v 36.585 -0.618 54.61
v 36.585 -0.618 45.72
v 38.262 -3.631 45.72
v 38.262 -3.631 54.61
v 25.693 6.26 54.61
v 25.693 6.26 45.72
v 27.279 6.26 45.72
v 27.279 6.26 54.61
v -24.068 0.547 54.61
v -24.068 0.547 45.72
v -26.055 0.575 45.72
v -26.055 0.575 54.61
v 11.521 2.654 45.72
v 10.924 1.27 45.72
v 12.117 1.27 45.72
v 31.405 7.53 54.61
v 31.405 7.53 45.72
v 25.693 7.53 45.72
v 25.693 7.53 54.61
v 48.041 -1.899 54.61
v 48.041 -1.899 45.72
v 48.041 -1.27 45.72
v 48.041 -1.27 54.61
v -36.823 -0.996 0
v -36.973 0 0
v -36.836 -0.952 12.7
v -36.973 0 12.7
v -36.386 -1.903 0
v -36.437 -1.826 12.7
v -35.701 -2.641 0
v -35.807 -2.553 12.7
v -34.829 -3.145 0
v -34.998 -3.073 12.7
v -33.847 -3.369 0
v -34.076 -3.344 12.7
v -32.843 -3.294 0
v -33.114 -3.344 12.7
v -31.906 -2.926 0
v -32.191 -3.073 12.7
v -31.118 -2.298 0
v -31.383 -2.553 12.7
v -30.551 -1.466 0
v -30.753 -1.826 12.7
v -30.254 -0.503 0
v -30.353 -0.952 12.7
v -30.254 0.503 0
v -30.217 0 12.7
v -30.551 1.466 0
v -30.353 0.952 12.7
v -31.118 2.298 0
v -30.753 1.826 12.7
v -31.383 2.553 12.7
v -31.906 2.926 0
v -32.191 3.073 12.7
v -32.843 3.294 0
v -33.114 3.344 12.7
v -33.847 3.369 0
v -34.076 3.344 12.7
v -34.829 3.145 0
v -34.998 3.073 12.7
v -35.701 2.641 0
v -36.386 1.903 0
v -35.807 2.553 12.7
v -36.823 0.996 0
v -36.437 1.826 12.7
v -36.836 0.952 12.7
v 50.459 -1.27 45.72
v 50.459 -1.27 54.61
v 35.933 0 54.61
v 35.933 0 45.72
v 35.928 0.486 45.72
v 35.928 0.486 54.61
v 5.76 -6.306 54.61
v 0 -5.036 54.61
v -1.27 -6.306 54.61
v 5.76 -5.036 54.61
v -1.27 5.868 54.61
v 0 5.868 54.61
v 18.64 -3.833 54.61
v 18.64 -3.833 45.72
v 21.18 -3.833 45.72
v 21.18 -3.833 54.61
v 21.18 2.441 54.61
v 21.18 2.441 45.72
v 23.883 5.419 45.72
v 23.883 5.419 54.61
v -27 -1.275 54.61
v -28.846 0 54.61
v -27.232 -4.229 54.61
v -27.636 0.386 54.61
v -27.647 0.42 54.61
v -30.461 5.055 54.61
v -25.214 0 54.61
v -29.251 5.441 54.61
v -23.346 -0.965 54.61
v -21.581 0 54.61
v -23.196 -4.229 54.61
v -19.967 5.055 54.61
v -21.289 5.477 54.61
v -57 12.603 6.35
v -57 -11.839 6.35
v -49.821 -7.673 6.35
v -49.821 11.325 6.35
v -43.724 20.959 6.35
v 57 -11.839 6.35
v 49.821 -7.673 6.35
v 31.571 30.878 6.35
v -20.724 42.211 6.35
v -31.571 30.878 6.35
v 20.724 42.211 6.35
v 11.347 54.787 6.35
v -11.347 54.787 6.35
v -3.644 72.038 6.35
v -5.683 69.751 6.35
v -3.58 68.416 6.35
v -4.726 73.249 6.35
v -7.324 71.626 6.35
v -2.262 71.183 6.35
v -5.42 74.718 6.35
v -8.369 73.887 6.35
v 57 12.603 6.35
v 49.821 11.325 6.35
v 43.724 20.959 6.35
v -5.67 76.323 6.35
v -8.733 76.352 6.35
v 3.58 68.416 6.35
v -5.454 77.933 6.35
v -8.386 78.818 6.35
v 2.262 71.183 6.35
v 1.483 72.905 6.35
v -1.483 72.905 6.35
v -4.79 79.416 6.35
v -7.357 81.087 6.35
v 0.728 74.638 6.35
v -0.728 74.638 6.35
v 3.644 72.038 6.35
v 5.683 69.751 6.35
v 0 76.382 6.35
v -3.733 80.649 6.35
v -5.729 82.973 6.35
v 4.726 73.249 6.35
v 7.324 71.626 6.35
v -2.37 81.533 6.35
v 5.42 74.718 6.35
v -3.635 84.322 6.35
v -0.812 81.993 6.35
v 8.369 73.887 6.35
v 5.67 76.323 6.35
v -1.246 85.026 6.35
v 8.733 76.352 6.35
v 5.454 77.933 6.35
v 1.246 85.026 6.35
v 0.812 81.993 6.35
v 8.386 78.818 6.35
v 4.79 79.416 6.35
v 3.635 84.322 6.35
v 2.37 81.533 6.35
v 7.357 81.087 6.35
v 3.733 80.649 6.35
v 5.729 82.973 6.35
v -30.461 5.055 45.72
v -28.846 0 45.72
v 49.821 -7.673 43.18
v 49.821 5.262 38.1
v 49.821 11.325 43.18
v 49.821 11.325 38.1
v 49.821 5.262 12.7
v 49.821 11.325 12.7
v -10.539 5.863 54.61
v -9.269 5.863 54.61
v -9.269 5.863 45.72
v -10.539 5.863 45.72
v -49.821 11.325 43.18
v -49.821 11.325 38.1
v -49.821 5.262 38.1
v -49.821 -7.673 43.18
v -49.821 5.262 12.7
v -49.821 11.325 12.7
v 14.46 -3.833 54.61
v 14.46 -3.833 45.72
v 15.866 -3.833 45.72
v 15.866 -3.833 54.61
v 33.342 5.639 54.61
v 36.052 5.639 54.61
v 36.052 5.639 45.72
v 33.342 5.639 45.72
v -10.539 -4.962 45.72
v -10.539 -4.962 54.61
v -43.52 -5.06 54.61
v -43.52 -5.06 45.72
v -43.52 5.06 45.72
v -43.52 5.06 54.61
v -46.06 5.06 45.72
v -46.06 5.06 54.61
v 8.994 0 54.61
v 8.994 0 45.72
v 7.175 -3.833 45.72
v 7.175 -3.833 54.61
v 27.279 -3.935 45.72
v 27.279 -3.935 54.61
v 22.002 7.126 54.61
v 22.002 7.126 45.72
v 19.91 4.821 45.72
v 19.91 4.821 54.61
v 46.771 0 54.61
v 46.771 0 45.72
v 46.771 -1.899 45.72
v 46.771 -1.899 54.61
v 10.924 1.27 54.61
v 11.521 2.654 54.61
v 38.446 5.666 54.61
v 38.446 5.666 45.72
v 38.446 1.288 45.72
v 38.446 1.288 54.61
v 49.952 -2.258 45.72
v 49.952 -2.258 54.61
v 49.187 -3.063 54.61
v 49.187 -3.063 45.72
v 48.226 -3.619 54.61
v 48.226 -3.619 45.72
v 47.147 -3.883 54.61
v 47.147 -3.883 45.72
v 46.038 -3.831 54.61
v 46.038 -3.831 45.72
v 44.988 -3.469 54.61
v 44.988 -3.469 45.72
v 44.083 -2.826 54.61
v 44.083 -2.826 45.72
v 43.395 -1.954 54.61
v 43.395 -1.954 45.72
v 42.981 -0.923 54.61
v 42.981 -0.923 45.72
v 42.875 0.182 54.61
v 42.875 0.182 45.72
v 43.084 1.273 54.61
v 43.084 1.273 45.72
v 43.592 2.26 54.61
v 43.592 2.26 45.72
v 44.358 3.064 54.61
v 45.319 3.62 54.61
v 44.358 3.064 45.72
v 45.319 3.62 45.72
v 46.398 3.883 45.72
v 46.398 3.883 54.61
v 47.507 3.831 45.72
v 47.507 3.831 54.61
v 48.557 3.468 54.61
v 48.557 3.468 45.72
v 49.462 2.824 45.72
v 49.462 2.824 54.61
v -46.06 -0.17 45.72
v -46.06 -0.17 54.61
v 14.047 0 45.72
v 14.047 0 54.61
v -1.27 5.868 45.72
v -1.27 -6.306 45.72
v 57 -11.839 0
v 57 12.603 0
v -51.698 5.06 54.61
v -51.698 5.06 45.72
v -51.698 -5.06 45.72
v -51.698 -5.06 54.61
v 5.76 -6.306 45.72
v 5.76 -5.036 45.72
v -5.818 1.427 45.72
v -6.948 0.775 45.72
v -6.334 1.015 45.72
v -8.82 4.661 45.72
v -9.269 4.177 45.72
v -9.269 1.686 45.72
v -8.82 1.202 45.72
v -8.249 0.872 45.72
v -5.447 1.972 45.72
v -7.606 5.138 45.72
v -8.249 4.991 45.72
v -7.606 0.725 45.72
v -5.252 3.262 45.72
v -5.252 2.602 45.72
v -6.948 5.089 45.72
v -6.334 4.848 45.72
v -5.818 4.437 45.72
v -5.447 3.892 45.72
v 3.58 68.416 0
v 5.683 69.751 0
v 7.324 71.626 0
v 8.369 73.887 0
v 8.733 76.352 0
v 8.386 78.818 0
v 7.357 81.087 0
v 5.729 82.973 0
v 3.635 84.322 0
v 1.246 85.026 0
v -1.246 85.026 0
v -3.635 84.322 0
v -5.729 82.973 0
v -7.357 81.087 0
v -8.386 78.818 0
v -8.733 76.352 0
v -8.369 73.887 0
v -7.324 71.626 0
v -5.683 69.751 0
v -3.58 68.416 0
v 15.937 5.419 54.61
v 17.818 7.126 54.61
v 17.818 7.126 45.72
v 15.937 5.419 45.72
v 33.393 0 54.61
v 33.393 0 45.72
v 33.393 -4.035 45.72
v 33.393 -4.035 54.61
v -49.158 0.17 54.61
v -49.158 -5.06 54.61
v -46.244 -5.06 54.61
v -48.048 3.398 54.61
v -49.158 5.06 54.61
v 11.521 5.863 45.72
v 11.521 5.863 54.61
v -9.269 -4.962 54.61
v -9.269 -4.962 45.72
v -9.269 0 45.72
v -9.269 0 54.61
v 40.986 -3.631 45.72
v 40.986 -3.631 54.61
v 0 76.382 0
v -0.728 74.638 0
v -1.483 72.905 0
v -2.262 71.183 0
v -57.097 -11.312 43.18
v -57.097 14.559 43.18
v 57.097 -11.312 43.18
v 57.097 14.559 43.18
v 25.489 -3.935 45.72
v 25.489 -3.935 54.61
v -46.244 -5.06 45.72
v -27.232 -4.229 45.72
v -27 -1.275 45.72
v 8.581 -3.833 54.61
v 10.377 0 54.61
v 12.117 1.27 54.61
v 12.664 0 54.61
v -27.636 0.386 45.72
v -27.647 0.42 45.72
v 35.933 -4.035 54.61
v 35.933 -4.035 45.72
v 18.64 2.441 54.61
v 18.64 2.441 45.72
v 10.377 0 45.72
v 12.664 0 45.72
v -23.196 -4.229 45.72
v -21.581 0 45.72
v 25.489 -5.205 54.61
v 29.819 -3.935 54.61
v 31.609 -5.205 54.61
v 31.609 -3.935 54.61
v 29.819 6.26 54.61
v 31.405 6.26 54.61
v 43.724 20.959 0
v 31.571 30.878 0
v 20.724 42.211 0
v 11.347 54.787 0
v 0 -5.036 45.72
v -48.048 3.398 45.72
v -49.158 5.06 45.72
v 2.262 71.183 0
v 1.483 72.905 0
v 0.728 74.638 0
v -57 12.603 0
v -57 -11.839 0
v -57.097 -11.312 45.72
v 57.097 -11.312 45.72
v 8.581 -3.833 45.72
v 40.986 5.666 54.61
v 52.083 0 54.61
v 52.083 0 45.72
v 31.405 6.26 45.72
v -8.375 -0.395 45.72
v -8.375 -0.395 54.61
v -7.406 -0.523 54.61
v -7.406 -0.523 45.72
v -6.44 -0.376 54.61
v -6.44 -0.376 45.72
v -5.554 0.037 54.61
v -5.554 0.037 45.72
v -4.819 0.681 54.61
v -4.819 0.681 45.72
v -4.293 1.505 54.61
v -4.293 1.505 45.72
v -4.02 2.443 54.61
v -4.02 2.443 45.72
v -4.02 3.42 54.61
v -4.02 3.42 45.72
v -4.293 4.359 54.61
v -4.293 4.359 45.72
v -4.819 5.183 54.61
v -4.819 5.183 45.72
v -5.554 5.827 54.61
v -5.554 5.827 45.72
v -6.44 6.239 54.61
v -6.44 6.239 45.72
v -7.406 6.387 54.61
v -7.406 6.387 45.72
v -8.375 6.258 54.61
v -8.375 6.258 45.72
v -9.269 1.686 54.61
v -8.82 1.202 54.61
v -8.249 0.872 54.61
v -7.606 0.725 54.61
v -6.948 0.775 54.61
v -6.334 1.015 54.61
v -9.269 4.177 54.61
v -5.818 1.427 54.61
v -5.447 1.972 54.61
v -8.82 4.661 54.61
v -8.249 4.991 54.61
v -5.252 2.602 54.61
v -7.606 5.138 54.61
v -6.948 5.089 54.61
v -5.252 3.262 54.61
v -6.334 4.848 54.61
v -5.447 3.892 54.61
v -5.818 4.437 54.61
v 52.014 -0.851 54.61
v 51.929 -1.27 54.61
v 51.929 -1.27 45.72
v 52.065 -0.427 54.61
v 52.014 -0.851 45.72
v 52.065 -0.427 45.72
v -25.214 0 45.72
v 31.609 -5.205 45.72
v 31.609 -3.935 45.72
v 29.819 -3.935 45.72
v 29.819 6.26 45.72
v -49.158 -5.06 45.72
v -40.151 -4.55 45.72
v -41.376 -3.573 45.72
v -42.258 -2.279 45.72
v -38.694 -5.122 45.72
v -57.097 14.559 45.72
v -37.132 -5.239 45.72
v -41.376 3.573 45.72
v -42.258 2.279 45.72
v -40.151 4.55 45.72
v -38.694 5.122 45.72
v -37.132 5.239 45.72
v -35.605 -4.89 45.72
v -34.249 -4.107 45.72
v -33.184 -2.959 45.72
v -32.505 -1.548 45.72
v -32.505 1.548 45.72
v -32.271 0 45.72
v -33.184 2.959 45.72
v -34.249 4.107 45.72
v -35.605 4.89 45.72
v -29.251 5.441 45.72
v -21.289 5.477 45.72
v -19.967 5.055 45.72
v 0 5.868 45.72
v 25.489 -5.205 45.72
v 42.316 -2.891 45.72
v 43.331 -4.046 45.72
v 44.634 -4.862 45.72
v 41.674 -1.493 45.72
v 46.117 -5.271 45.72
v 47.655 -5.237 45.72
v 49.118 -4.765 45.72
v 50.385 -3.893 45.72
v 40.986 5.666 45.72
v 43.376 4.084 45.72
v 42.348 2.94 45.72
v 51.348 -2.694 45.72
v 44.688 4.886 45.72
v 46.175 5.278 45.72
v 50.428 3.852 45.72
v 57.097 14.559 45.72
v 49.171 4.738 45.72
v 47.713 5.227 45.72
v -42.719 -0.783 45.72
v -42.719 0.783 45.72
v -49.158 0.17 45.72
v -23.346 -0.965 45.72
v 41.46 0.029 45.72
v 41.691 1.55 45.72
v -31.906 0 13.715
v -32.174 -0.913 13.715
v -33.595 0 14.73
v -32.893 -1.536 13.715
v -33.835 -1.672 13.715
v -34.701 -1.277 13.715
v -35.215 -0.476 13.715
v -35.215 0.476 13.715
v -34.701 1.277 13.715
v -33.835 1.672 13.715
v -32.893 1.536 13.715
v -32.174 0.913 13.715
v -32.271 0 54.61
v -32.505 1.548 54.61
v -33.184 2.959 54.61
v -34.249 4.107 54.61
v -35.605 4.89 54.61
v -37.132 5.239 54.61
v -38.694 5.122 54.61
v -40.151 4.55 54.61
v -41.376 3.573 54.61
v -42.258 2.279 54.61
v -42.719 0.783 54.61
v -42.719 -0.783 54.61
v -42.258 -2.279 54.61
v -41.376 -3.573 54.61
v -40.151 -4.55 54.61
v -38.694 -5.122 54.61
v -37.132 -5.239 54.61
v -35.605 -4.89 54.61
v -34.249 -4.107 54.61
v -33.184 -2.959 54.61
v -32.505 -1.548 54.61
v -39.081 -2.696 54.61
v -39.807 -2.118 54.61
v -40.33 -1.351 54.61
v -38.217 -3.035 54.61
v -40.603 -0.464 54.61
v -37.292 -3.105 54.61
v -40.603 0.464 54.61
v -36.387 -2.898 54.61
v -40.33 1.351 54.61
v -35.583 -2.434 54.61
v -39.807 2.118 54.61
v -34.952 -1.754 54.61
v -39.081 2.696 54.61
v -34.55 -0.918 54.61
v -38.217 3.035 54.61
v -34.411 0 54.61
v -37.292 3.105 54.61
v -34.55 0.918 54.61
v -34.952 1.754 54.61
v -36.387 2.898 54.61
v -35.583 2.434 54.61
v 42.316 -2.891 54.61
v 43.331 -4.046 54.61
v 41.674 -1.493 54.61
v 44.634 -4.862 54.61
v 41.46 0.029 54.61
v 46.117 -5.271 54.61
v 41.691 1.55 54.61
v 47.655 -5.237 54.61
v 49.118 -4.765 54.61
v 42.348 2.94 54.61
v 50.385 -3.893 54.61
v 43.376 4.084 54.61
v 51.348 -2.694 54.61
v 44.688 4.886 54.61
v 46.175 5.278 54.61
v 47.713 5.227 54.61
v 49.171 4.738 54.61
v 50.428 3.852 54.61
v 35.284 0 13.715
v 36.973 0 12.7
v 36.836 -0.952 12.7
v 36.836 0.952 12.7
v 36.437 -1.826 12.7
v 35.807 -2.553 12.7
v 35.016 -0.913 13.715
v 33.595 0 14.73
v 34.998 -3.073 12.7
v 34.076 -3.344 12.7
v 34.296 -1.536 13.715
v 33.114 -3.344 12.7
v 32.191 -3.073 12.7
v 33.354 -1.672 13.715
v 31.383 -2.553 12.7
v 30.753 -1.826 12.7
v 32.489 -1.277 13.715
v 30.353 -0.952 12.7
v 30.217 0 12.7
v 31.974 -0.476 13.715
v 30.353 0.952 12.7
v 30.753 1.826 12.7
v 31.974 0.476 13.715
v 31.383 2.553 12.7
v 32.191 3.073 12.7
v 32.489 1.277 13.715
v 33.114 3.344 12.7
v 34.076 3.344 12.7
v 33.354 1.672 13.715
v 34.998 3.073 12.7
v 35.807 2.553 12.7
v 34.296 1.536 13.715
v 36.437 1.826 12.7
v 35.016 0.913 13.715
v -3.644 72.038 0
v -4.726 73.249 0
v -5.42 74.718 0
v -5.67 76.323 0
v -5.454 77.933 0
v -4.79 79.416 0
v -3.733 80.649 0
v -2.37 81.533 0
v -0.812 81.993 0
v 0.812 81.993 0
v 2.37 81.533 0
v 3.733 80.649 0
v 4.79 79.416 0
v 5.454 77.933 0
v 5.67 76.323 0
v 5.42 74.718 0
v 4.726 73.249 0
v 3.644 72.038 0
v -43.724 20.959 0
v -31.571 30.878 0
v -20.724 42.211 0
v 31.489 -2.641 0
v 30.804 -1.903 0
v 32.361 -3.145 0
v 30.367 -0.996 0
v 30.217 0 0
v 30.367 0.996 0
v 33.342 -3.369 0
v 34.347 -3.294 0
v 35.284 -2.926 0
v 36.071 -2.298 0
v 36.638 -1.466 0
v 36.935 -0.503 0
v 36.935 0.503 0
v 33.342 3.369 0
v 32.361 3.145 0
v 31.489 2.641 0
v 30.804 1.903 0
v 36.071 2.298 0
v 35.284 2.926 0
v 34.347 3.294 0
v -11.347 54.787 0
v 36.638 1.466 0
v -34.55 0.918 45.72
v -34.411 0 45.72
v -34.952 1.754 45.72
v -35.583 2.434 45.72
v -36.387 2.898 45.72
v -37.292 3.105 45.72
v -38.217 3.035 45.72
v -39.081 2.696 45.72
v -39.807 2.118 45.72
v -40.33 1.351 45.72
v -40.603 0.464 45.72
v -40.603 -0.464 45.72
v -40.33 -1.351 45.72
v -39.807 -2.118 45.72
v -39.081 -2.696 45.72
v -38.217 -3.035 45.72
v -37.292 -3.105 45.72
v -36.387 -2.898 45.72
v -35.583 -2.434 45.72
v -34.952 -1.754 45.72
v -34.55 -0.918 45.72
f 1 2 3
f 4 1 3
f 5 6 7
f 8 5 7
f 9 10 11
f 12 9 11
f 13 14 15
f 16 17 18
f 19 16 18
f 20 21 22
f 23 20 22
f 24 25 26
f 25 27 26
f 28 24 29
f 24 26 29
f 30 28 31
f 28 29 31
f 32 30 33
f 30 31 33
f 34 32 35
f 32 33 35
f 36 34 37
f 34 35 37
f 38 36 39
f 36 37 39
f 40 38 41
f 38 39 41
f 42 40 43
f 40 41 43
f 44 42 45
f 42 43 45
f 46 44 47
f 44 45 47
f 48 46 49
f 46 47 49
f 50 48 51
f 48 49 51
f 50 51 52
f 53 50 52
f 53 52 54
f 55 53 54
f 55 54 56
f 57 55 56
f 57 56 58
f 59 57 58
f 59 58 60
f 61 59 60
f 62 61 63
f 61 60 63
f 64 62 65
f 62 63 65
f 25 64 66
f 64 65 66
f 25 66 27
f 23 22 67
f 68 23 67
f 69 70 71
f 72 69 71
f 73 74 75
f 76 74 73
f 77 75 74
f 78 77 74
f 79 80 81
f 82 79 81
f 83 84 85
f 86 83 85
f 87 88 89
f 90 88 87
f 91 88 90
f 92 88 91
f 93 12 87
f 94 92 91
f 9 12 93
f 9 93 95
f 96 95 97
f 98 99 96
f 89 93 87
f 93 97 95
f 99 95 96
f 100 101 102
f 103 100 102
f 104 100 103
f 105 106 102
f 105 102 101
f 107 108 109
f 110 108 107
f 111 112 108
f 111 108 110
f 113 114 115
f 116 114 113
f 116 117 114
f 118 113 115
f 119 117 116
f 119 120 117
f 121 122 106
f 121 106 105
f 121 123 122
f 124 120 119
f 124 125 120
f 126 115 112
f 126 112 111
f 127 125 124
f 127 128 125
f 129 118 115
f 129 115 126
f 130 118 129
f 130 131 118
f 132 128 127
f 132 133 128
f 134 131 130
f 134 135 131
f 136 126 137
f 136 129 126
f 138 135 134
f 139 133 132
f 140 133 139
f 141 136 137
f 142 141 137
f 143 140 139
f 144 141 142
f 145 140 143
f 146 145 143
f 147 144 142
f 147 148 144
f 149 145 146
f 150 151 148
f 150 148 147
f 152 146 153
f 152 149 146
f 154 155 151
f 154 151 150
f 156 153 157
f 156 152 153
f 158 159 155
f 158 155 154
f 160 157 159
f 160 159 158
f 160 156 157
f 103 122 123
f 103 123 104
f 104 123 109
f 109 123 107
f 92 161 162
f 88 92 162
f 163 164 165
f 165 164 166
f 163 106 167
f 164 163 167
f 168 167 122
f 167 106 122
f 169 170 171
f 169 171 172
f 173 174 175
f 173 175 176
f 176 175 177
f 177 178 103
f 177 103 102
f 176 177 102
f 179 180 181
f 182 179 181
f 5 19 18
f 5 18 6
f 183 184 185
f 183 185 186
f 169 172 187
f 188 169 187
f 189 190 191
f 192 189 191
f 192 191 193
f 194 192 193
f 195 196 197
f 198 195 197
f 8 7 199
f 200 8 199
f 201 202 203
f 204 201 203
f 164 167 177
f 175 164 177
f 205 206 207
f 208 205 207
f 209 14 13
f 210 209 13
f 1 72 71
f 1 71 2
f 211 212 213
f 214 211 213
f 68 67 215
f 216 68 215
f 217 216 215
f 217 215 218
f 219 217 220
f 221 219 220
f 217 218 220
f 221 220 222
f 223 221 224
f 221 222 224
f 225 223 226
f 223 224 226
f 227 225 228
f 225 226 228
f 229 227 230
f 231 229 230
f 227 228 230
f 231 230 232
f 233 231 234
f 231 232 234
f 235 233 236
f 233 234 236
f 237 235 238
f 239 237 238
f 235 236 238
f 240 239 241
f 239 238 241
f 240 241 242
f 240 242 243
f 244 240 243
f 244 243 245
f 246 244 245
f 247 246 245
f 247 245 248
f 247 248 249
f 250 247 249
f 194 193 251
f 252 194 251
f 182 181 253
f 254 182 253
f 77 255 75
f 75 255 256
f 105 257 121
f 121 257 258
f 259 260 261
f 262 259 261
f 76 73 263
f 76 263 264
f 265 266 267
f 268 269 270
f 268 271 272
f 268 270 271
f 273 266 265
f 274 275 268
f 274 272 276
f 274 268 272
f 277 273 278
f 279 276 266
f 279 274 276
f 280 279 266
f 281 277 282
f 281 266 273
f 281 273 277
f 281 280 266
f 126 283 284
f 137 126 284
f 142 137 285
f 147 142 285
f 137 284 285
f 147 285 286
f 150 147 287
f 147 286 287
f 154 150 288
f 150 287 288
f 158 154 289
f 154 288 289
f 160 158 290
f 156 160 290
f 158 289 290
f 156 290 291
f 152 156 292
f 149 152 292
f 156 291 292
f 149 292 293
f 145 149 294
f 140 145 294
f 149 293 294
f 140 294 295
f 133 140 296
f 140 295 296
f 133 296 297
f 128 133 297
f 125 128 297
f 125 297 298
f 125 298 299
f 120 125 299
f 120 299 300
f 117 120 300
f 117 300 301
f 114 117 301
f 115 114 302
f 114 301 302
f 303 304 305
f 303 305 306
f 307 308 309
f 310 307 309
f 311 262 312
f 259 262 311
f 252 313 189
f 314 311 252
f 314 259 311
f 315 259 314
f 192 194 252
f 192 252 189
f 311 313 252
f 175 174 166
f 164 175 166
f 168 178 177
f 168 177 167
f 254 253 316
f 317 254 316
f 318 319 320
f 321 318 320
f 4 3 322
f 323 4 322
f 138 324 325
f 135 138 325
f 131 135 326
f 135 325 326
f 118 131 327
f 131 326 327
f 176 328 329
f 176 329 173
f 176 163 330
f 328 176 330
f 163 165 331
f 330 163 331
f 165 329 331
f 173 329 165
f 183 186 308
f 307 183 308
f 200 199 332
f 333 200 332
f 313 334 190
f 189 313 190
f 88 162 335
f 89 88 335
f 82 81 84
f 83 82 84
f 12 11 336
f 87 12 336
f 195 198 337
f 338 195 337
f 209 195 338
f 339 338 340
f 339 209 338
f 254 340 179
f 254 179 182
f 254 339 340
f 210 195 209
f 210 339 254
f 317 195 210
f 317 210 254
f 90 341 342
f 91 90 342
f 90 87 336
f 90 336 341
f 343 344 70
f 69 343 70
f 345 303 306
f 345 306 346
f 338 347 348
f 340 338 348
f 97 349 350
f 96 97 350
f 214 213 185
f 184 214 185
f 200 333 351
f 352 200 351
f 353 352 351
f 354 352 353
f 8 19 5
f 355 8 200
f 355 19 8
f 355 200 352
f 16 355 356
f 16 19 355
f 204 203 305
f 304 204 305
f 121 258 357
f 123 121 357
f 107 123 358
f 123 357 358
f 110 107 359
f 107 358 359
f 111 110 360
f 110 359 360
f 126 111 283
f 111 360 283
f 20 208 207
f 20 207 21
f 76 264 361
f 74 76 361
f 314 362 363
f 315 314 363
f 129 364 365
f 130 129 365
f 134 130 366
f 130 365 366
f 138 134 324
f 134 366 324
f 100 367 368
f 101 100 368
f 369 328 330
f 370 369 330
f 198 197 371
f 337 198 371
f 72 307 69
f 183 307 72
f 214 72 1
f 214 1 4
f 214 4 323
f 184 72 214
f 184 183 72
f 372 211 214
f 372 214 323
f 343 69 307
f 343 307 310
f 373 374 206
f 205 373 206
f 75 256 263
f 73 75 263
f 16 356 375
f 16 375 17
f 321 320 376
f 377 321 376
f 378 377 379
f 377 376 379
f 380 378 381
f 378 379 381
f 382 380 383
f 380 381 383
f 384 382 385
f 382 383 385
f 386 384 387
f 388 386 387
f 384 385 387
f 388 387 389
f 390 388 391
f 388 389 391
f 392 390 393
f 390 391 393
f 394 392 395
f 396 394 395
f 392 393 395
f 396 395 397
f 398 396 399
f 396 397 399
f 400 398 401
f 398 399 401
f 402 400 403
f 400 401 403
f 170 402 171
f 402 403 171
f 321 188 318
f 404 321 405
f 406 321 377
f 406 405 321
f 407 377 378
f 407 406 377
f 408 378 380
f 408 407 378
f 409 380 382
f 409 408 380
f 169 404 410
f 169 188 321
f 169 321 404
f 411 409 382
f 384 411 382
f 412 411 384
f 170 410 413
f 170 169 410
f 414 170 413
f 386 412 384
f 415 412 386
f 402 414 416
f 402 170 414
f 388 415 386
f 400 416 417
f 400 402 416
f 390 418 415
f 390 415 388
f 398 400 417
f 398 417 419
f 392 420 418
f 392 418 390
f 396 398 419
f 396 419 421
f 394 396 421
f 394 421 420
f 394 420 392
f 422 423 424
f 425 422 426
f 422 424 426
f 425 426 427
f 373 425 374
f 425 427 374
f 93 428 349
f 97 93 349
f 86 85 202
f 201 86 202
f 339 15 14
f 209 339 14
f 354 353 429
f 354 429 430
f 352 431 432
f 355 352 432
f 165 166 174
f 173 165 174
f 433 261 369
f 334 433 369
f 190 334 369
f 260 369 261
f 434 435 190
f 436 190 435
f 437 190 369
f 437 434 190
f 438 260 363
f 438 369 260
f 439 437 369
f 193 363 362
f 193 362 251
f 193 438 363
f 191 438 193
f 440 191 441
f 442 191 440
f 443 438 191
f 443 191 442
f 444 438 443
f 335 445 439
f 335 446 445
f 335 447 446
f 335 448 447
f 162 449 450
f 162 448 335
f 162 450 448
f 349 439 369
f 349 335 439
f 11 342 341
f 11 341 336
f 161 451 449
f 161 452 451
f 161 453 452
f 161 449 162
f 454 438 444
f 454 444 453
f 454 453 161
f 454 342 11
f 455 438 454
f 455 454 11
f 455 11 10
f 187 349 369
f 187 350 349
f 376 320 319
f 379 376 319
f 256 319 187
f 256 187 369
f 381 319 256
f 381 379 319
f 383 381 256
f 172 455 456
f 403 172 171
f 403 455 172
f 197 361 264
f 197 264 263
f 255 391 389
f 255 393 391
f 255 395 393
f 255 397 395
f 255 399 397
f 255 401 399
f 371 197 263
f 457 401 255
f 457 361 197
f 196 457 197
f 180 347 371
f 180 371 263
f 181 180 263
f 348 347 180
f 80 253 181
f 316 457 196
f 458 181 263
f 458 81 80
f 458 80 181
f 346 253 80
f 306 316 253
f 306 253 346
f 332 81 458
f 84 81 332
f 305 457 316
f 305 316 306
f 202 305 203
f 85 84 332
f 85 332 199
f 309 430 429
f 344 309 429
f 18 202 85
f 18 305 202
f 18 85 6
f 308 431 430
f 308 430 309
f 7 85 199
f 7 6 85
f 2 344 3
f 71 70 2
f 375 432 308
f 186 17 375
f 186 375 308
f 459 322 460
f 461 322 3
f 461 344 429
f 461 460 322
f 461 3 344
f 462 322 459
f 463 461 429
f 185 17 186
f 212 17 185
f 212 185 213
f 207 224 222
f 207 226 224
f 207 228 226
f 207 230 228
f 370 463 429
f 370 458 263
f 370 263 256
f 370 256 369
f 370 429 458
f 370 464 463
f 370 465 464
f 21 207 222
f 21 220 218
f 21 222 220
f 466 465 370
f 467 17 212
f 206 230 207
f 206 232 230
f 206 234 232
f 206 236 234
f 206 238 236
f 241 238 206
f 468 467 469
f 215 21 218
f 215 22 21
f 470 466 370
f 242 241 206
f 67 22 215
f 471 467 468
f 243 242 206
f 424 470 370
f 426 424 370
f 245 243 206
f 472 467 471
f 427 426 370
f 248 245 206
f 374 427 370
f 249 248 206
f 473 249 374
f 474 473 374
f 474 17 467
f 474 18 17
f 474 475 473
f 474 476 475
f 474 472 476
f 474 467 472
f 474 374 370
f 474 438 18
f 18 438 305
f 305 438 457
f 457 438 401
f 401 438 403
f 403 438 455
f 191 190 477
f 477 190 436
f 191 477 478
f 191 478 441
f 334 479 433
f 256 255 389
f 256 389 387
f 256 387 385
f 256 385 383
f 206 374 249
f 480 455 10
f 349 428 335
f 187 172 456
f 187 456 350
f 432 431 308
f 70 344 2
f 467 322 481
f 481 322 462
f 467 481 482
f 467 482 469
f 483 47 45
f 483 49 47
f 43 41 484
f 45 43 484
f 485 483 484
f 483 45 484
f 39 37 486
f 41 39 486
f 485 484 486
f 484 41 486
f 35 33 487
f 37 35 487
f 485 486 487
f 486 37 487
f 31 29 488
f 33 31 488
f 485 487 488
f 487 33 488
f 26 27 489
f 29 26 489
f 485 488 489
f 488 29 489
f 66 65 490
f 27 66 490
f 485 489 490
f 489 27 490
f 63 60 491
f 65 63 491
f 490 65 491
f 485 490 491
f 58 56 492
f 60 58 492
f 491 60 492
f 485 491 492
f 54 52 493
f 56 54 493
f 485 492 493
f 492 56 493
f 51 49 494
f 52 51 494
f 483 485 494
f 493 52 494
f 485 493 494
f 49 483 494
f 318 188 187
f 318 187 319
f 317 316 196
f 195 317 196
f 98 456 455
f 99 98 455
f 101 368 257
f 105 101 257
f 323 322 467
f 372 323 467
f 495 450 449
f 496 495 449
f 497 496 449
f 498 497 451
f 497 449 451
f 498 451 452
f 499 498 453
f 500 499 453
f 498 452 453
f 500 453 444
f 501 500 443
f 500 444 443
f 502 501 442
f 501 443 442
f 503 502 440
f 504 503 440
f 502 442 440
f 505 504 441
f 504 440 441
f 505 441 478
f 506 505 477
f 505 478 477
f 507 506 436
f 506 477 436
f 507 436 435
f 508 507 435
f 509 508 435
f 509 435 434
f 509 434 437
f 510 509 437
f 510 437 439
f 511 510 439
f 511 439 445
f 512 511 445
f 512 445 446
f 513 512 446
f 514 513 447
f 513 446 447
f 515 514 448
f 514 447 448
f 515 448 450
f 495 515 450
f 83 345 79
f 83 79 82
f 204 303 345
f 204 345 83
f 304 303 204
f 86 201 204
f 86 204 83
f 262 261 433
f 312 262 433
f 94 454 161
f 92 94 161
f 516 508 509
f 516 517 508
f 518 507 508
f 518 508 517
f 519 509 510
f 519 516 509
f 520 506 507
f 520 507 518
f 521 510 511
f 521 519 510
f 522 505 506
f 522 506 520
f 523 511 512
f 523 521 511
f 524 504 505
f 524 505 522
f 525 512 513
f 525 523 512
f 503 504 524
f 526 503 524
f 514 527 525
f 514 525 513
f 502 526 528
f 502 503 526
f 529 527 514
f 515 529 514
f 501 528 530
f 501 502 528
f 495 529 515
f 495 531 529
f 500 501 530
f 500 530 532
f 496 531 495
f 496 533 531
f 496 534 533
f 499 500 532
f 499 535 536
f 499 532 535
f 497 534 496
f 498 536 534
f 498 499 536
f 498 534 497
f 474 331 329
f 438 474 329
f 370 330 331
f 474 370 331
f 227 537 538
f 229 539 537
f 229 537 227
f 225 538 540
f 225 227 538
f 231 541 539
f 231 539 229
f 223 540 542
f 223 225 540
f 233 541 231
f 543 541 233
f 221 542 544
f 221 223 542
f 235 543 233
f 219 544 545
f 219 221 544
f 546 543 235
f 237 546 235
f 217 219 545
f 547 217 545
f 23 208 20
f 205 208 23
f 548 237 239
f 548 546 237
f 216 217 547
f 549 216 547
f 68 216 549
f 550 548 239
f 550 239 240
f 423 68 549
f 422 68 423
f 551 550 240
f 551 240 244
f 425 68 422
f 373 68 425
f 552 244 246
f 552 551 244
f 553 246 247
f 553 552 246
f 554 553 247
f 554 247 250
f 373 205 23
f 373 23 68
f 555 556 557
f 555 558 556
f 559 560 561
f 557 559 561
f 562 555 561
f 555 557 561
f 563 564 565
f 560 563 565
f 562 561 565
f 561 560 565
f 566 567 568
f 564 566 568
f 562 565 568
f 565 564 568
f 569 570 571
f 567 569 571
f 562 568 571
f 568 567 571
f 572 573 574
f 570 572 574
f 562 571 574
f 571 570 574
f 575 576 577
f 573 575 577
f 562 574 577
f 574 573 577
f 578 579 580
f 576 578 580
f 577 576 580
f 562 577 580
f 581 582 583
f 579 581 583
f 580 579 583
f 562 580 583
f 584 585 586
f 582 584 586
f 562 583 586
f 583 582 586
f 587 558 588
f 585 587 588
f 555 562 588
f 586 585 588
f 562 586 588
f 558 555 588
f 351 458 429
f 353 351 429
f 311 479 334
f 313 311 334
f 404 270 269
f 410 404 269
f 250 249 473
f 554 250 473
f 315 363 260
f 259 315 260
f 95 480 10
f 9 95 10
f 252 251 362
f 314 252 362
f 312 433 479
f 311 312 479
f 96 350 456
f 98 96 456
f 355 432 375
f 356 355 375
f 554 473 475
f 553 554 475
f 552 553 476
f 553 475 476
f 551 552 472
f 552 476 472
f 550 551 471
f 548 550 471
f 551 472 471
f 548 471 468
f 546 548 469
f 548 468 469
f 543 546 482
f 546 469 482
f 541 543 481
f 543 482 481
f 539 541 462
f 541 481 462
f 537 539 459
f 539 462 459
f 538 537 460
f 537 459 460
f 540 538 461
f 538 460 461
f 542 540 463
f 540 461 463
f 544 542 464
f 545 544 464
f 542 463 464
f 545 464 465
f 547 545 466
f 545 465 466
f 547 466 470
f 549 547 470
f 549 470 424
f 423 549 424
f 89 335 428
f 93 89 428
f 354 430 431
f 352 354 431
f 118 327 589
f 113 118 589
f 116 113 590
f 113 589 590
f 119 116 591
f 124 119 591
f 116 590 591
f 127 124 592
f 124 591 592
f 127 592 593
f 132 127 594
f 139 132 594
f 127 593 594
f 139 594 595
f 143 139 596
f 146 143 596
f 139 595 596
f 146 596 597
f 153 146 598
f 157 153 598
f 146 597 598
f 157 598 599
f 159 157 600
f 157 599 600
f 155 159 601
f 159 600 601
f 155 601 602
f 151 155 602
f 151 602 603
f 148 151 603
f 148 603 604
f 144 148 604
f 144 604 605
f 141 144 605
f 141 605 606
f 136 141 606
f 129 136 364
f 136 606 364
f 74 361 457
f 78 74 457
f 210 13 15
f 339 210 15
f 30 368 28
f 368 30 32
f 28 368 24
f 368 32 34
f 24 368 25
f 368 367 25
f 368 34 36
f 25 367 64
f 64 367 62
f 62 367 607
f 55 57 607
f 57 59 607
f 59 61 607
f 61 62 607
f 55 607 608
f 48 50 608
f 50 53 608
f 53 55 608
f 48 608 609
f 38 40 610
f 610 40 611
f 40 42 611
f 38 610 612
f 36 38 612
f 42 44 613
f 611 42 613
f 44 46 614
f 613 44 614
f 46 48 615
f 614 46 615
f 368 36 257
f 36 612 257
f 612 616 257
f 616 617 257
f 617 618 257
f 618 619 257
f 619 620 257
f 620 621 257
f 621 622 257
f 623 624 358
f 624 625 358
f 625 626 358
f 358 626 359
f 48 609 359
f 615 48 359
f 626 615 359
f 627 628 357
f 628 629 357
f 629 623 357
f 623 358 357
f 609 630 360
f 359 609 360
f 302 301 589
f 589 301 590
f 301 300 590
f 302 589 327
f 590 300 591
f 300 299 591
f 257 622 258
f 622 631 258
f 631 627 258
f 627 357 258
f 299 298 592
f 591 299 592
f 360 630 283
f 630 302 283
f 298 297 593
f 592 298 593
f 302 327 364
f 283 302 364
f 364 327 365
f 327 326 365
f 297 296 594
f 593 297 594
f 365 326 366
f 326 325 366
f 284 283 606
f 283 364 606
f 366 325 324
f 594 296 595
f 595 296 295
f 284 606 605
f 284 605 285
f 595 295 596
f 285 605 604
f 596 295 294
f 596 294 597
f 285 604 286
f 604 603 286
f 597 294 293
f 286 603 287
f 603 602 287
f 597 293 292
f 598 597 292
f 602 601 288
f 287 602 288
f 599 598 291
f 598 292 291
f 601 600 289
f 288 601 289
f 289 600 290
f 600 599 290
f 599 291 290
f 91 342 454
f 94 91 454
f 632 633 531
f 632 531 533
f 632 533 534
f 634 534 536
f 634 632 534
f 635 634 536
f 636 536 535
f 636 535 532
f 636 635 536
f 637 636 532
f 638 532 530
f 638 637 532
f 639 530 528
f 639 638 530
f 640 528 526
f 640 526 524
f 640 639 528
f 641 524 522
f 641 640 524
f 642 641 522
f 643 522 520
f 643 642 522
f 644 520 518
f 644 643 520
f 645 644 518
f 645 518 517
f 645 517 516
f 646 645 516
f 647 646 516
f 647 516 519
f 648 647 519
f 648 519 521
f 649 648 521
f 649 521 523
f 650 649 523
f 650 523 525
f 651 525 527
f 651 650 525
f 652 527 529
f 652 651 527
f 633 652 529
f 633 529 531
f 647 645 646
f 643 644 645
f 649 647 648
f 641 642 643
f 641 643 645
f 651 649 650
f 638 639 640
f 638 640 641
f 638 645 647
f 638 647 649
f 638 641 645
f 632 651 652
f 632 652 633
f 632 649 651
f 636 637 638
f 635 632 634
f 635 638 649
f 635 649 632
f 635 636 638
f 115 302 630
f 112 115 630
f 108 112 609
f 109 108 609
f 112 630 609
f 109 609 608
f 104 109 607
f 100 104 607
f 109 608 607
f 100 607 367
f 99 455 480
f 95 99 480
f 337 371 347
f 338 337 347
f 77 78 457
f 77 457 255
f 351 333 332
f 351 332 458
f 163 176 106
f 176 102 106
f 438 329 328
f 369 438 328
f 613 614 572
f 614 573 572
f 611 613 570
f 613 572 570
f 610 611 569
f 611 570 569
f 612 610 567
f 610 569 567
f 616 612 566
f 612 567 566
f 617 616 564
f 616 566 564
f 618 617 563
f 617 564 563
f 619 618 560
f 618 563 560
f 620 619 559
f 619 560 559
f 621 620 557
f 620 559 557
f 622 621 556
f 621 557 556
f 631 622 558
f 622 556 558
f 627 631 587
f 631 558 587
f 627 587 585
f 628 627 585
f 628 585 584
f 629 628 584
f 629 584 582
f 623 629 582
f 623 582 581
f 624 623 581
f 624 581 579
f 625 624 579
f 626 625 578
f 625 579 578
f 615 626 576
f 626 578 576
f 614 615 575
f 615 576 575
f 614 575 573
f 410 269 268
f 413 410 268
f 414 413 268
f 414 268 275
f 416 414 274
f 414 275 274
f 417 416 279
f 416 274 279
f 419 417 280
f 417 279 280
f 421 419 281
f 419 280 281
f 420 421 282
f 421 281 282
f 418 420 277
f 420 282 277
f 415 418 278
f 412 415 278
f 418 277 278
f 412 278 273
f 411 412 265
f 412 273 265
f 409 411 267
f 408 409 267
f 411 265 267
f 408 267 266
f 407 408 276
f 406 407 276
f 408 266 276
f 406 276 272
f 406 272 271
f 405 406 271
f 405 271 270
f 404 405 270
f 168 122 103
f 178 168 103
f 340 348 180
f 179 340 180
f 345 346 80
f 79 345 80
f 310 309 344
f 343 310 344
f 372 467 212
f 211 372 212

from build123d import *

# Parameters (mm, degrees)
F1_DEPTH  = 6.35
F3_DEPTH  = 6.35
F5_DEPTH  = 25.4
F7_D      = 6.7564
F7_DEPTH  = 12.7
F7_TIP    = 2.0298273432
F9_DEPTH  = 5.08
F10_W     = 99.64261204
F10_H     = 18.998793792
F11_DEPTH = 2.54
F12_R     = 5.2534292615
F12_R_2   = 3.1134110093
F13_DEPTH = 8.89


with BuildPart() as f1:
    # F0 (on Top) → F1 (new body)
    with BuildSketch(Plane.XY):
        with BuildLine():
            Line((-56.9999665022, -11.8391886353), (0, -11.8391886353))
            Line((0, -11.8391886353), (56.9999665022, -11.8391886353))
            Line((56.9999665022, -11.8391886353), (56.9999665022, 12.603007257))
            ThreePointArc((56.9999665022, 12.603007257), (25.9733436303, 36.3780469183), (3.5801271207, 68.4162692798))
            ThreePointArc((3.5801271207, 68.4162692798), (0, 85.1150162439), (-3.5801271207, 68.4162692798))
            ThreePointArc((-3.5801271207, 68.4162692798), (-25.9733436303, 36.3780469183), (-56.9999665022, 12.603007257))
            Line((-56.9999665022, 12.603007257), (-56.9999665022, -11.8391886353))
        make_face()
        with BuildLine():
            ThreePointArc((2.2622125896, 71.1828075513), (1.1022822123, 73.769792923), (0, 76.3818621635))
            ThreePointArc((0, 76.3818621635), (-1.1022822123, 73.769792923), (-2.2622125896, 71.1828075513))
            ThreePointArc((-2.2622125896, 71.1828075513), (0, 82.0517629264), (2.2622125896, 71.1828075513))
        make_face(mode=Mode.SUBTRACT)
    extrude(amount=F1_DEPTH)

    # F2 (on face) → F3 (join)
    with BuildSketch(Plane.XY.offset(6.35)):
        Polygon((0, -7.67345028), (0, 0), (0, 11.325343512), (-49.82130602, 11.325343512), (-49.82130602, -7.67345028), align=None)
        Polygon((0, 11.325343512), (0, 0), (0, -7.67345028), (49.82130602, -7.67345028), (49.82130602, 11.325343512), align=None)
    extrude(amount=F3_DEPTH)

    # F4 (on face) → F5 (join)
    with BuildSketch(Plane.XY.offset(12.7)):
        Polygon((0, -7.67345028), (0, 0), (0, 5.2618985064), (-49.82130602, 5.2618985064), (-49.82130602, -7.67345028), align=None)
        Polygon((0, 5.2618985064), (0, 0), (0, -7.67345028), (49.82130602, -7.67345028), (49.82130602, 5.2618985064), align=None)
    extrude(amount=F5_DEPTH)

    # F7
    with Locations(Plane(origin=(0, 0, 0), x_dir=(1, 0, 0), z_dir=(0, 0, -1))):
        with Locations((33.5948169231, 0), (-33.5948169231, 0)):
            Hole(F7_D / 2, depth=F7_DEPTH)
            with Locations((0, 0, -(F7_DEPTH + F7_TIP / 2))):  # 118° drill point
                Cone(0, F7_D / 2, F7_TIP, mode=Mode.SUBTRACT)

    # F8 (on face) → F9 (join)
    with BuildSketch(Plane.XY.offset(38.1)):
        Polygon((49.82130602, 11.325343512), (0, 11.325343512), (-49.82130602, 11.325343512), (-49.82130602, 5.2618985064), (49.82130602, 5.2618985064), align=None)
        Polygon((49.82130602, 5.2618985064), (-49.82130602, 5.2618985064), (-49.82130602, -7.67345028), (0, -7.67345028), (49.82130602, -7.67345028), align=None)
    extrude(amount=F9_DEPTH)

    # F10 (on face) → F11 (join)
    with BuildSketch(Plane.XY.offset(43.18)):
        Polygon((57.0974387228, 14.5591804758), (0, 14.5591804758), (-57.0974387228, 14.5591804758), (-57.0974387228, -11.3115180284), (0, -11.3115180284), (57.0974387228, -11.3115180284), align=None)
        with Locations((0, 1.825946616)):
            Rectangle(F10_W, F10_H, mode=Mode.SUBTRACT)
        with Locations((0, 1.825946616)):
            Rectangle(F10_W, F10_H)
    extrude(amount=F11_DEPTH)

    # F12 (on face) → F13 (join)
    with BuildSketch(Plane.XY.offset(45.72)):
        Polygon((8.5808153566, -3.8332685363), (10.3769853802, 0), (11.520545464, 0), (12.6641055479, 0), (14.4602755714, -3.8332685363), (15.8660151064, -3.8332685363), (14.0469819307, 0), (11.520545464, 5.8634341694), (8.9941089973, 0), (7.1750758216, -3.8332685363), align=None)
        Polygon((12.1168879583, 1.27), (10.9242029697, 1.27), (11.520545464, 2.6540106426), align=None, mode=Mode.SUBTRACT)
        Polygon((15.9370799004, 5.4188976225), (18.6398400772, 2.4412850335), (18.6398400772, -3.8332685363), (21.1798400772, -3.8332685363), (21.1798400772, 2.4412850335), (23.8826002539, 5.4188976225), (22.0018450558, 7.1260472599), (19.9098400772, 4.821299538), (17.8178350986, 7.1260472599), align=None)
        with Locations((-37.5246331096, 0)):
            Circle(F12_R)
        with Locations((-37.5246331096, 0)):
            Circle(F12_R_2, mode=Mode.SUBTRACT)
        Polygon((-49.1576491702, -5.0597838126), (-49.1576491702, 0), (-49.1576491702, 0.1703951603), (-46.2440352845, -5.0597838126), (-46.0602679443, -5.0597838126), (-43.5202679443, -5.0597838126), (-43.5202679443, 0), (-43.5202679443, 5.0597838126), (-46.0602679443, 5.0597838126), (-46.0602679443, 0), (-46.0602679443, -0.1703951603), (-48.0481869093, 3.398084528), (-49.1576491702, 5.0597838126), (-51.6976491702, 5.0597838126), (-51.6976491702, 0), (-51.6976491702, -5.0597838126), align=None)
        Polygon((-30.4608233273, 5.0550824963), (-28.8462378085, 0), (-27.2316522896, -4.2287833057), (-25.2138245851, 0), (-23.1959968805, -4.2287833057), (-21.5814113617, 0), (-19.9668258429, 5.0550824963), (-21.2886028552, 5.4772560265), (-23.3462245652, -0.964922086), (-24.0676257065, 0.5469260742), (-26.0552410036, 0.5746004754), (-26.9999829904, -1.2750737017), (-27.6364480741, 0.3864049672), (-27.6471869469, 0.4200271491), (-29.2510335929, 5.4414874634), align=None)
        with BuildLine():
            Line((-9.2688109726, -4.9615180284), (-9.2688109726, 0))
            ThreePointArc((-9.2688109726, 0), (-3.9849187402, 2.9317170847), (-9.2688109726, 5.8634341694))
            Line((-9.2688109726, 5.8634341694), (-10.5388109726, 5.8634341694))
            Line((-10.5388109726, 5.8634341694), (-10.5388109726, -4.9615180284))
            Line((-10.5388109726, -4.9615180284), (-9.2688109726, -4.9615180284))
        make_face()
        with BuildLine():
            ThreePointArc((-9.2688109726, 4.1773487671), (-5.2276091663, 2.9317170847), (-9.2688109726, 1.6860854024))
            Line((-9.2688109726, 1.6860854024), (-9.2688109726, 4.1773487671))
        make_face(mode=Mode.SUBTRACT)
        Polygon((0, -5.0356499851), (0, 0), (0, 5.8682430536), (-1.27, 5.8682430536), (-1.27, -5.0356499851), (-1.27, -6.3056499851), (0, -6.3056499851), (5.7602738962, -6.3056499851), (5.7602738962, -5.0356499851), (1.27, -5.0356499851), align=None)
        Polygon((27.2789596426, 6.2596681528), (27.2789596426, -3.9345640689), (25.489365682, -3.9345640689), (25.489365682, -5.2045640689), (28.5489596426, -5.2045640689), (31.6085536033, -5.2045640689), (31.6085536033, -3.9345640689), (29.8189596426, -3.9345640689), (29.8189596426, 6.2596681528), (31.4045827836, 6.2596681528), (31.4045827836, 7.5296681528), (28.5489596426, 7.5296681528), (25.6933365017, 7.5296681528), (25.6933365017, 6.2596681528), align=None)
        Polygon((35.9326937389, -4.0353834629), (35.9326937389, 0), (35.9283116314, 0.4862386956), (36.5847326672, -0.6176642146), (38.2620843736, -3.6311536096), (38.4455657411, -3.6311536096), (40.9855657411, -3.6311536096), (40.9855657411, 5.6661283597), (38.4455657411, 5.6661283597), (38.4455657411, 1.2884770307), (36.0522442713, 5.638557907), (35.8818776127, 5.638557907), (33.3418776127, 5.638557907), (33.3926937389, 0), (33.3926937389, -4.0353834629), align=None)
        with BuildLine():
            Line((50.4276491702, 0), (46.7712655663, 0))
            Line((46.7712655663, 0), (46.7712655663, -1.8991101533))
            Line((46.7712655663, -1.8991101533), (48.0412655663, -1.8991101533))
            Line((48.0412655663, -1.8991101533), (48.0412655663, -1.27))
            Line((48.0412655663, -1.27), (50.4594443439, -1.27))
            ThreePointArc((50.4594443439, -1.27), (42.9814431355, -0.9234763875), (49.461772222, 2.8243117093))
            Line((49.461772222, 2.8243117093), (50.4276491702, 3.852418304))
            ThreePointArc((50.4276491702, 3.852418304), (41.6742187173, -1.493446104), (51.9285291671, -1.27))
            ThreePointArc((51.9285291671, -1.27), (52.043941209, -0.6396557001), (52.0825994711, 0))
            Line((52.0825994711, 0), (50.4276491702, 0))
        make_face()
    extrude(amount=F13_DEPTH)


solid = f1.part
